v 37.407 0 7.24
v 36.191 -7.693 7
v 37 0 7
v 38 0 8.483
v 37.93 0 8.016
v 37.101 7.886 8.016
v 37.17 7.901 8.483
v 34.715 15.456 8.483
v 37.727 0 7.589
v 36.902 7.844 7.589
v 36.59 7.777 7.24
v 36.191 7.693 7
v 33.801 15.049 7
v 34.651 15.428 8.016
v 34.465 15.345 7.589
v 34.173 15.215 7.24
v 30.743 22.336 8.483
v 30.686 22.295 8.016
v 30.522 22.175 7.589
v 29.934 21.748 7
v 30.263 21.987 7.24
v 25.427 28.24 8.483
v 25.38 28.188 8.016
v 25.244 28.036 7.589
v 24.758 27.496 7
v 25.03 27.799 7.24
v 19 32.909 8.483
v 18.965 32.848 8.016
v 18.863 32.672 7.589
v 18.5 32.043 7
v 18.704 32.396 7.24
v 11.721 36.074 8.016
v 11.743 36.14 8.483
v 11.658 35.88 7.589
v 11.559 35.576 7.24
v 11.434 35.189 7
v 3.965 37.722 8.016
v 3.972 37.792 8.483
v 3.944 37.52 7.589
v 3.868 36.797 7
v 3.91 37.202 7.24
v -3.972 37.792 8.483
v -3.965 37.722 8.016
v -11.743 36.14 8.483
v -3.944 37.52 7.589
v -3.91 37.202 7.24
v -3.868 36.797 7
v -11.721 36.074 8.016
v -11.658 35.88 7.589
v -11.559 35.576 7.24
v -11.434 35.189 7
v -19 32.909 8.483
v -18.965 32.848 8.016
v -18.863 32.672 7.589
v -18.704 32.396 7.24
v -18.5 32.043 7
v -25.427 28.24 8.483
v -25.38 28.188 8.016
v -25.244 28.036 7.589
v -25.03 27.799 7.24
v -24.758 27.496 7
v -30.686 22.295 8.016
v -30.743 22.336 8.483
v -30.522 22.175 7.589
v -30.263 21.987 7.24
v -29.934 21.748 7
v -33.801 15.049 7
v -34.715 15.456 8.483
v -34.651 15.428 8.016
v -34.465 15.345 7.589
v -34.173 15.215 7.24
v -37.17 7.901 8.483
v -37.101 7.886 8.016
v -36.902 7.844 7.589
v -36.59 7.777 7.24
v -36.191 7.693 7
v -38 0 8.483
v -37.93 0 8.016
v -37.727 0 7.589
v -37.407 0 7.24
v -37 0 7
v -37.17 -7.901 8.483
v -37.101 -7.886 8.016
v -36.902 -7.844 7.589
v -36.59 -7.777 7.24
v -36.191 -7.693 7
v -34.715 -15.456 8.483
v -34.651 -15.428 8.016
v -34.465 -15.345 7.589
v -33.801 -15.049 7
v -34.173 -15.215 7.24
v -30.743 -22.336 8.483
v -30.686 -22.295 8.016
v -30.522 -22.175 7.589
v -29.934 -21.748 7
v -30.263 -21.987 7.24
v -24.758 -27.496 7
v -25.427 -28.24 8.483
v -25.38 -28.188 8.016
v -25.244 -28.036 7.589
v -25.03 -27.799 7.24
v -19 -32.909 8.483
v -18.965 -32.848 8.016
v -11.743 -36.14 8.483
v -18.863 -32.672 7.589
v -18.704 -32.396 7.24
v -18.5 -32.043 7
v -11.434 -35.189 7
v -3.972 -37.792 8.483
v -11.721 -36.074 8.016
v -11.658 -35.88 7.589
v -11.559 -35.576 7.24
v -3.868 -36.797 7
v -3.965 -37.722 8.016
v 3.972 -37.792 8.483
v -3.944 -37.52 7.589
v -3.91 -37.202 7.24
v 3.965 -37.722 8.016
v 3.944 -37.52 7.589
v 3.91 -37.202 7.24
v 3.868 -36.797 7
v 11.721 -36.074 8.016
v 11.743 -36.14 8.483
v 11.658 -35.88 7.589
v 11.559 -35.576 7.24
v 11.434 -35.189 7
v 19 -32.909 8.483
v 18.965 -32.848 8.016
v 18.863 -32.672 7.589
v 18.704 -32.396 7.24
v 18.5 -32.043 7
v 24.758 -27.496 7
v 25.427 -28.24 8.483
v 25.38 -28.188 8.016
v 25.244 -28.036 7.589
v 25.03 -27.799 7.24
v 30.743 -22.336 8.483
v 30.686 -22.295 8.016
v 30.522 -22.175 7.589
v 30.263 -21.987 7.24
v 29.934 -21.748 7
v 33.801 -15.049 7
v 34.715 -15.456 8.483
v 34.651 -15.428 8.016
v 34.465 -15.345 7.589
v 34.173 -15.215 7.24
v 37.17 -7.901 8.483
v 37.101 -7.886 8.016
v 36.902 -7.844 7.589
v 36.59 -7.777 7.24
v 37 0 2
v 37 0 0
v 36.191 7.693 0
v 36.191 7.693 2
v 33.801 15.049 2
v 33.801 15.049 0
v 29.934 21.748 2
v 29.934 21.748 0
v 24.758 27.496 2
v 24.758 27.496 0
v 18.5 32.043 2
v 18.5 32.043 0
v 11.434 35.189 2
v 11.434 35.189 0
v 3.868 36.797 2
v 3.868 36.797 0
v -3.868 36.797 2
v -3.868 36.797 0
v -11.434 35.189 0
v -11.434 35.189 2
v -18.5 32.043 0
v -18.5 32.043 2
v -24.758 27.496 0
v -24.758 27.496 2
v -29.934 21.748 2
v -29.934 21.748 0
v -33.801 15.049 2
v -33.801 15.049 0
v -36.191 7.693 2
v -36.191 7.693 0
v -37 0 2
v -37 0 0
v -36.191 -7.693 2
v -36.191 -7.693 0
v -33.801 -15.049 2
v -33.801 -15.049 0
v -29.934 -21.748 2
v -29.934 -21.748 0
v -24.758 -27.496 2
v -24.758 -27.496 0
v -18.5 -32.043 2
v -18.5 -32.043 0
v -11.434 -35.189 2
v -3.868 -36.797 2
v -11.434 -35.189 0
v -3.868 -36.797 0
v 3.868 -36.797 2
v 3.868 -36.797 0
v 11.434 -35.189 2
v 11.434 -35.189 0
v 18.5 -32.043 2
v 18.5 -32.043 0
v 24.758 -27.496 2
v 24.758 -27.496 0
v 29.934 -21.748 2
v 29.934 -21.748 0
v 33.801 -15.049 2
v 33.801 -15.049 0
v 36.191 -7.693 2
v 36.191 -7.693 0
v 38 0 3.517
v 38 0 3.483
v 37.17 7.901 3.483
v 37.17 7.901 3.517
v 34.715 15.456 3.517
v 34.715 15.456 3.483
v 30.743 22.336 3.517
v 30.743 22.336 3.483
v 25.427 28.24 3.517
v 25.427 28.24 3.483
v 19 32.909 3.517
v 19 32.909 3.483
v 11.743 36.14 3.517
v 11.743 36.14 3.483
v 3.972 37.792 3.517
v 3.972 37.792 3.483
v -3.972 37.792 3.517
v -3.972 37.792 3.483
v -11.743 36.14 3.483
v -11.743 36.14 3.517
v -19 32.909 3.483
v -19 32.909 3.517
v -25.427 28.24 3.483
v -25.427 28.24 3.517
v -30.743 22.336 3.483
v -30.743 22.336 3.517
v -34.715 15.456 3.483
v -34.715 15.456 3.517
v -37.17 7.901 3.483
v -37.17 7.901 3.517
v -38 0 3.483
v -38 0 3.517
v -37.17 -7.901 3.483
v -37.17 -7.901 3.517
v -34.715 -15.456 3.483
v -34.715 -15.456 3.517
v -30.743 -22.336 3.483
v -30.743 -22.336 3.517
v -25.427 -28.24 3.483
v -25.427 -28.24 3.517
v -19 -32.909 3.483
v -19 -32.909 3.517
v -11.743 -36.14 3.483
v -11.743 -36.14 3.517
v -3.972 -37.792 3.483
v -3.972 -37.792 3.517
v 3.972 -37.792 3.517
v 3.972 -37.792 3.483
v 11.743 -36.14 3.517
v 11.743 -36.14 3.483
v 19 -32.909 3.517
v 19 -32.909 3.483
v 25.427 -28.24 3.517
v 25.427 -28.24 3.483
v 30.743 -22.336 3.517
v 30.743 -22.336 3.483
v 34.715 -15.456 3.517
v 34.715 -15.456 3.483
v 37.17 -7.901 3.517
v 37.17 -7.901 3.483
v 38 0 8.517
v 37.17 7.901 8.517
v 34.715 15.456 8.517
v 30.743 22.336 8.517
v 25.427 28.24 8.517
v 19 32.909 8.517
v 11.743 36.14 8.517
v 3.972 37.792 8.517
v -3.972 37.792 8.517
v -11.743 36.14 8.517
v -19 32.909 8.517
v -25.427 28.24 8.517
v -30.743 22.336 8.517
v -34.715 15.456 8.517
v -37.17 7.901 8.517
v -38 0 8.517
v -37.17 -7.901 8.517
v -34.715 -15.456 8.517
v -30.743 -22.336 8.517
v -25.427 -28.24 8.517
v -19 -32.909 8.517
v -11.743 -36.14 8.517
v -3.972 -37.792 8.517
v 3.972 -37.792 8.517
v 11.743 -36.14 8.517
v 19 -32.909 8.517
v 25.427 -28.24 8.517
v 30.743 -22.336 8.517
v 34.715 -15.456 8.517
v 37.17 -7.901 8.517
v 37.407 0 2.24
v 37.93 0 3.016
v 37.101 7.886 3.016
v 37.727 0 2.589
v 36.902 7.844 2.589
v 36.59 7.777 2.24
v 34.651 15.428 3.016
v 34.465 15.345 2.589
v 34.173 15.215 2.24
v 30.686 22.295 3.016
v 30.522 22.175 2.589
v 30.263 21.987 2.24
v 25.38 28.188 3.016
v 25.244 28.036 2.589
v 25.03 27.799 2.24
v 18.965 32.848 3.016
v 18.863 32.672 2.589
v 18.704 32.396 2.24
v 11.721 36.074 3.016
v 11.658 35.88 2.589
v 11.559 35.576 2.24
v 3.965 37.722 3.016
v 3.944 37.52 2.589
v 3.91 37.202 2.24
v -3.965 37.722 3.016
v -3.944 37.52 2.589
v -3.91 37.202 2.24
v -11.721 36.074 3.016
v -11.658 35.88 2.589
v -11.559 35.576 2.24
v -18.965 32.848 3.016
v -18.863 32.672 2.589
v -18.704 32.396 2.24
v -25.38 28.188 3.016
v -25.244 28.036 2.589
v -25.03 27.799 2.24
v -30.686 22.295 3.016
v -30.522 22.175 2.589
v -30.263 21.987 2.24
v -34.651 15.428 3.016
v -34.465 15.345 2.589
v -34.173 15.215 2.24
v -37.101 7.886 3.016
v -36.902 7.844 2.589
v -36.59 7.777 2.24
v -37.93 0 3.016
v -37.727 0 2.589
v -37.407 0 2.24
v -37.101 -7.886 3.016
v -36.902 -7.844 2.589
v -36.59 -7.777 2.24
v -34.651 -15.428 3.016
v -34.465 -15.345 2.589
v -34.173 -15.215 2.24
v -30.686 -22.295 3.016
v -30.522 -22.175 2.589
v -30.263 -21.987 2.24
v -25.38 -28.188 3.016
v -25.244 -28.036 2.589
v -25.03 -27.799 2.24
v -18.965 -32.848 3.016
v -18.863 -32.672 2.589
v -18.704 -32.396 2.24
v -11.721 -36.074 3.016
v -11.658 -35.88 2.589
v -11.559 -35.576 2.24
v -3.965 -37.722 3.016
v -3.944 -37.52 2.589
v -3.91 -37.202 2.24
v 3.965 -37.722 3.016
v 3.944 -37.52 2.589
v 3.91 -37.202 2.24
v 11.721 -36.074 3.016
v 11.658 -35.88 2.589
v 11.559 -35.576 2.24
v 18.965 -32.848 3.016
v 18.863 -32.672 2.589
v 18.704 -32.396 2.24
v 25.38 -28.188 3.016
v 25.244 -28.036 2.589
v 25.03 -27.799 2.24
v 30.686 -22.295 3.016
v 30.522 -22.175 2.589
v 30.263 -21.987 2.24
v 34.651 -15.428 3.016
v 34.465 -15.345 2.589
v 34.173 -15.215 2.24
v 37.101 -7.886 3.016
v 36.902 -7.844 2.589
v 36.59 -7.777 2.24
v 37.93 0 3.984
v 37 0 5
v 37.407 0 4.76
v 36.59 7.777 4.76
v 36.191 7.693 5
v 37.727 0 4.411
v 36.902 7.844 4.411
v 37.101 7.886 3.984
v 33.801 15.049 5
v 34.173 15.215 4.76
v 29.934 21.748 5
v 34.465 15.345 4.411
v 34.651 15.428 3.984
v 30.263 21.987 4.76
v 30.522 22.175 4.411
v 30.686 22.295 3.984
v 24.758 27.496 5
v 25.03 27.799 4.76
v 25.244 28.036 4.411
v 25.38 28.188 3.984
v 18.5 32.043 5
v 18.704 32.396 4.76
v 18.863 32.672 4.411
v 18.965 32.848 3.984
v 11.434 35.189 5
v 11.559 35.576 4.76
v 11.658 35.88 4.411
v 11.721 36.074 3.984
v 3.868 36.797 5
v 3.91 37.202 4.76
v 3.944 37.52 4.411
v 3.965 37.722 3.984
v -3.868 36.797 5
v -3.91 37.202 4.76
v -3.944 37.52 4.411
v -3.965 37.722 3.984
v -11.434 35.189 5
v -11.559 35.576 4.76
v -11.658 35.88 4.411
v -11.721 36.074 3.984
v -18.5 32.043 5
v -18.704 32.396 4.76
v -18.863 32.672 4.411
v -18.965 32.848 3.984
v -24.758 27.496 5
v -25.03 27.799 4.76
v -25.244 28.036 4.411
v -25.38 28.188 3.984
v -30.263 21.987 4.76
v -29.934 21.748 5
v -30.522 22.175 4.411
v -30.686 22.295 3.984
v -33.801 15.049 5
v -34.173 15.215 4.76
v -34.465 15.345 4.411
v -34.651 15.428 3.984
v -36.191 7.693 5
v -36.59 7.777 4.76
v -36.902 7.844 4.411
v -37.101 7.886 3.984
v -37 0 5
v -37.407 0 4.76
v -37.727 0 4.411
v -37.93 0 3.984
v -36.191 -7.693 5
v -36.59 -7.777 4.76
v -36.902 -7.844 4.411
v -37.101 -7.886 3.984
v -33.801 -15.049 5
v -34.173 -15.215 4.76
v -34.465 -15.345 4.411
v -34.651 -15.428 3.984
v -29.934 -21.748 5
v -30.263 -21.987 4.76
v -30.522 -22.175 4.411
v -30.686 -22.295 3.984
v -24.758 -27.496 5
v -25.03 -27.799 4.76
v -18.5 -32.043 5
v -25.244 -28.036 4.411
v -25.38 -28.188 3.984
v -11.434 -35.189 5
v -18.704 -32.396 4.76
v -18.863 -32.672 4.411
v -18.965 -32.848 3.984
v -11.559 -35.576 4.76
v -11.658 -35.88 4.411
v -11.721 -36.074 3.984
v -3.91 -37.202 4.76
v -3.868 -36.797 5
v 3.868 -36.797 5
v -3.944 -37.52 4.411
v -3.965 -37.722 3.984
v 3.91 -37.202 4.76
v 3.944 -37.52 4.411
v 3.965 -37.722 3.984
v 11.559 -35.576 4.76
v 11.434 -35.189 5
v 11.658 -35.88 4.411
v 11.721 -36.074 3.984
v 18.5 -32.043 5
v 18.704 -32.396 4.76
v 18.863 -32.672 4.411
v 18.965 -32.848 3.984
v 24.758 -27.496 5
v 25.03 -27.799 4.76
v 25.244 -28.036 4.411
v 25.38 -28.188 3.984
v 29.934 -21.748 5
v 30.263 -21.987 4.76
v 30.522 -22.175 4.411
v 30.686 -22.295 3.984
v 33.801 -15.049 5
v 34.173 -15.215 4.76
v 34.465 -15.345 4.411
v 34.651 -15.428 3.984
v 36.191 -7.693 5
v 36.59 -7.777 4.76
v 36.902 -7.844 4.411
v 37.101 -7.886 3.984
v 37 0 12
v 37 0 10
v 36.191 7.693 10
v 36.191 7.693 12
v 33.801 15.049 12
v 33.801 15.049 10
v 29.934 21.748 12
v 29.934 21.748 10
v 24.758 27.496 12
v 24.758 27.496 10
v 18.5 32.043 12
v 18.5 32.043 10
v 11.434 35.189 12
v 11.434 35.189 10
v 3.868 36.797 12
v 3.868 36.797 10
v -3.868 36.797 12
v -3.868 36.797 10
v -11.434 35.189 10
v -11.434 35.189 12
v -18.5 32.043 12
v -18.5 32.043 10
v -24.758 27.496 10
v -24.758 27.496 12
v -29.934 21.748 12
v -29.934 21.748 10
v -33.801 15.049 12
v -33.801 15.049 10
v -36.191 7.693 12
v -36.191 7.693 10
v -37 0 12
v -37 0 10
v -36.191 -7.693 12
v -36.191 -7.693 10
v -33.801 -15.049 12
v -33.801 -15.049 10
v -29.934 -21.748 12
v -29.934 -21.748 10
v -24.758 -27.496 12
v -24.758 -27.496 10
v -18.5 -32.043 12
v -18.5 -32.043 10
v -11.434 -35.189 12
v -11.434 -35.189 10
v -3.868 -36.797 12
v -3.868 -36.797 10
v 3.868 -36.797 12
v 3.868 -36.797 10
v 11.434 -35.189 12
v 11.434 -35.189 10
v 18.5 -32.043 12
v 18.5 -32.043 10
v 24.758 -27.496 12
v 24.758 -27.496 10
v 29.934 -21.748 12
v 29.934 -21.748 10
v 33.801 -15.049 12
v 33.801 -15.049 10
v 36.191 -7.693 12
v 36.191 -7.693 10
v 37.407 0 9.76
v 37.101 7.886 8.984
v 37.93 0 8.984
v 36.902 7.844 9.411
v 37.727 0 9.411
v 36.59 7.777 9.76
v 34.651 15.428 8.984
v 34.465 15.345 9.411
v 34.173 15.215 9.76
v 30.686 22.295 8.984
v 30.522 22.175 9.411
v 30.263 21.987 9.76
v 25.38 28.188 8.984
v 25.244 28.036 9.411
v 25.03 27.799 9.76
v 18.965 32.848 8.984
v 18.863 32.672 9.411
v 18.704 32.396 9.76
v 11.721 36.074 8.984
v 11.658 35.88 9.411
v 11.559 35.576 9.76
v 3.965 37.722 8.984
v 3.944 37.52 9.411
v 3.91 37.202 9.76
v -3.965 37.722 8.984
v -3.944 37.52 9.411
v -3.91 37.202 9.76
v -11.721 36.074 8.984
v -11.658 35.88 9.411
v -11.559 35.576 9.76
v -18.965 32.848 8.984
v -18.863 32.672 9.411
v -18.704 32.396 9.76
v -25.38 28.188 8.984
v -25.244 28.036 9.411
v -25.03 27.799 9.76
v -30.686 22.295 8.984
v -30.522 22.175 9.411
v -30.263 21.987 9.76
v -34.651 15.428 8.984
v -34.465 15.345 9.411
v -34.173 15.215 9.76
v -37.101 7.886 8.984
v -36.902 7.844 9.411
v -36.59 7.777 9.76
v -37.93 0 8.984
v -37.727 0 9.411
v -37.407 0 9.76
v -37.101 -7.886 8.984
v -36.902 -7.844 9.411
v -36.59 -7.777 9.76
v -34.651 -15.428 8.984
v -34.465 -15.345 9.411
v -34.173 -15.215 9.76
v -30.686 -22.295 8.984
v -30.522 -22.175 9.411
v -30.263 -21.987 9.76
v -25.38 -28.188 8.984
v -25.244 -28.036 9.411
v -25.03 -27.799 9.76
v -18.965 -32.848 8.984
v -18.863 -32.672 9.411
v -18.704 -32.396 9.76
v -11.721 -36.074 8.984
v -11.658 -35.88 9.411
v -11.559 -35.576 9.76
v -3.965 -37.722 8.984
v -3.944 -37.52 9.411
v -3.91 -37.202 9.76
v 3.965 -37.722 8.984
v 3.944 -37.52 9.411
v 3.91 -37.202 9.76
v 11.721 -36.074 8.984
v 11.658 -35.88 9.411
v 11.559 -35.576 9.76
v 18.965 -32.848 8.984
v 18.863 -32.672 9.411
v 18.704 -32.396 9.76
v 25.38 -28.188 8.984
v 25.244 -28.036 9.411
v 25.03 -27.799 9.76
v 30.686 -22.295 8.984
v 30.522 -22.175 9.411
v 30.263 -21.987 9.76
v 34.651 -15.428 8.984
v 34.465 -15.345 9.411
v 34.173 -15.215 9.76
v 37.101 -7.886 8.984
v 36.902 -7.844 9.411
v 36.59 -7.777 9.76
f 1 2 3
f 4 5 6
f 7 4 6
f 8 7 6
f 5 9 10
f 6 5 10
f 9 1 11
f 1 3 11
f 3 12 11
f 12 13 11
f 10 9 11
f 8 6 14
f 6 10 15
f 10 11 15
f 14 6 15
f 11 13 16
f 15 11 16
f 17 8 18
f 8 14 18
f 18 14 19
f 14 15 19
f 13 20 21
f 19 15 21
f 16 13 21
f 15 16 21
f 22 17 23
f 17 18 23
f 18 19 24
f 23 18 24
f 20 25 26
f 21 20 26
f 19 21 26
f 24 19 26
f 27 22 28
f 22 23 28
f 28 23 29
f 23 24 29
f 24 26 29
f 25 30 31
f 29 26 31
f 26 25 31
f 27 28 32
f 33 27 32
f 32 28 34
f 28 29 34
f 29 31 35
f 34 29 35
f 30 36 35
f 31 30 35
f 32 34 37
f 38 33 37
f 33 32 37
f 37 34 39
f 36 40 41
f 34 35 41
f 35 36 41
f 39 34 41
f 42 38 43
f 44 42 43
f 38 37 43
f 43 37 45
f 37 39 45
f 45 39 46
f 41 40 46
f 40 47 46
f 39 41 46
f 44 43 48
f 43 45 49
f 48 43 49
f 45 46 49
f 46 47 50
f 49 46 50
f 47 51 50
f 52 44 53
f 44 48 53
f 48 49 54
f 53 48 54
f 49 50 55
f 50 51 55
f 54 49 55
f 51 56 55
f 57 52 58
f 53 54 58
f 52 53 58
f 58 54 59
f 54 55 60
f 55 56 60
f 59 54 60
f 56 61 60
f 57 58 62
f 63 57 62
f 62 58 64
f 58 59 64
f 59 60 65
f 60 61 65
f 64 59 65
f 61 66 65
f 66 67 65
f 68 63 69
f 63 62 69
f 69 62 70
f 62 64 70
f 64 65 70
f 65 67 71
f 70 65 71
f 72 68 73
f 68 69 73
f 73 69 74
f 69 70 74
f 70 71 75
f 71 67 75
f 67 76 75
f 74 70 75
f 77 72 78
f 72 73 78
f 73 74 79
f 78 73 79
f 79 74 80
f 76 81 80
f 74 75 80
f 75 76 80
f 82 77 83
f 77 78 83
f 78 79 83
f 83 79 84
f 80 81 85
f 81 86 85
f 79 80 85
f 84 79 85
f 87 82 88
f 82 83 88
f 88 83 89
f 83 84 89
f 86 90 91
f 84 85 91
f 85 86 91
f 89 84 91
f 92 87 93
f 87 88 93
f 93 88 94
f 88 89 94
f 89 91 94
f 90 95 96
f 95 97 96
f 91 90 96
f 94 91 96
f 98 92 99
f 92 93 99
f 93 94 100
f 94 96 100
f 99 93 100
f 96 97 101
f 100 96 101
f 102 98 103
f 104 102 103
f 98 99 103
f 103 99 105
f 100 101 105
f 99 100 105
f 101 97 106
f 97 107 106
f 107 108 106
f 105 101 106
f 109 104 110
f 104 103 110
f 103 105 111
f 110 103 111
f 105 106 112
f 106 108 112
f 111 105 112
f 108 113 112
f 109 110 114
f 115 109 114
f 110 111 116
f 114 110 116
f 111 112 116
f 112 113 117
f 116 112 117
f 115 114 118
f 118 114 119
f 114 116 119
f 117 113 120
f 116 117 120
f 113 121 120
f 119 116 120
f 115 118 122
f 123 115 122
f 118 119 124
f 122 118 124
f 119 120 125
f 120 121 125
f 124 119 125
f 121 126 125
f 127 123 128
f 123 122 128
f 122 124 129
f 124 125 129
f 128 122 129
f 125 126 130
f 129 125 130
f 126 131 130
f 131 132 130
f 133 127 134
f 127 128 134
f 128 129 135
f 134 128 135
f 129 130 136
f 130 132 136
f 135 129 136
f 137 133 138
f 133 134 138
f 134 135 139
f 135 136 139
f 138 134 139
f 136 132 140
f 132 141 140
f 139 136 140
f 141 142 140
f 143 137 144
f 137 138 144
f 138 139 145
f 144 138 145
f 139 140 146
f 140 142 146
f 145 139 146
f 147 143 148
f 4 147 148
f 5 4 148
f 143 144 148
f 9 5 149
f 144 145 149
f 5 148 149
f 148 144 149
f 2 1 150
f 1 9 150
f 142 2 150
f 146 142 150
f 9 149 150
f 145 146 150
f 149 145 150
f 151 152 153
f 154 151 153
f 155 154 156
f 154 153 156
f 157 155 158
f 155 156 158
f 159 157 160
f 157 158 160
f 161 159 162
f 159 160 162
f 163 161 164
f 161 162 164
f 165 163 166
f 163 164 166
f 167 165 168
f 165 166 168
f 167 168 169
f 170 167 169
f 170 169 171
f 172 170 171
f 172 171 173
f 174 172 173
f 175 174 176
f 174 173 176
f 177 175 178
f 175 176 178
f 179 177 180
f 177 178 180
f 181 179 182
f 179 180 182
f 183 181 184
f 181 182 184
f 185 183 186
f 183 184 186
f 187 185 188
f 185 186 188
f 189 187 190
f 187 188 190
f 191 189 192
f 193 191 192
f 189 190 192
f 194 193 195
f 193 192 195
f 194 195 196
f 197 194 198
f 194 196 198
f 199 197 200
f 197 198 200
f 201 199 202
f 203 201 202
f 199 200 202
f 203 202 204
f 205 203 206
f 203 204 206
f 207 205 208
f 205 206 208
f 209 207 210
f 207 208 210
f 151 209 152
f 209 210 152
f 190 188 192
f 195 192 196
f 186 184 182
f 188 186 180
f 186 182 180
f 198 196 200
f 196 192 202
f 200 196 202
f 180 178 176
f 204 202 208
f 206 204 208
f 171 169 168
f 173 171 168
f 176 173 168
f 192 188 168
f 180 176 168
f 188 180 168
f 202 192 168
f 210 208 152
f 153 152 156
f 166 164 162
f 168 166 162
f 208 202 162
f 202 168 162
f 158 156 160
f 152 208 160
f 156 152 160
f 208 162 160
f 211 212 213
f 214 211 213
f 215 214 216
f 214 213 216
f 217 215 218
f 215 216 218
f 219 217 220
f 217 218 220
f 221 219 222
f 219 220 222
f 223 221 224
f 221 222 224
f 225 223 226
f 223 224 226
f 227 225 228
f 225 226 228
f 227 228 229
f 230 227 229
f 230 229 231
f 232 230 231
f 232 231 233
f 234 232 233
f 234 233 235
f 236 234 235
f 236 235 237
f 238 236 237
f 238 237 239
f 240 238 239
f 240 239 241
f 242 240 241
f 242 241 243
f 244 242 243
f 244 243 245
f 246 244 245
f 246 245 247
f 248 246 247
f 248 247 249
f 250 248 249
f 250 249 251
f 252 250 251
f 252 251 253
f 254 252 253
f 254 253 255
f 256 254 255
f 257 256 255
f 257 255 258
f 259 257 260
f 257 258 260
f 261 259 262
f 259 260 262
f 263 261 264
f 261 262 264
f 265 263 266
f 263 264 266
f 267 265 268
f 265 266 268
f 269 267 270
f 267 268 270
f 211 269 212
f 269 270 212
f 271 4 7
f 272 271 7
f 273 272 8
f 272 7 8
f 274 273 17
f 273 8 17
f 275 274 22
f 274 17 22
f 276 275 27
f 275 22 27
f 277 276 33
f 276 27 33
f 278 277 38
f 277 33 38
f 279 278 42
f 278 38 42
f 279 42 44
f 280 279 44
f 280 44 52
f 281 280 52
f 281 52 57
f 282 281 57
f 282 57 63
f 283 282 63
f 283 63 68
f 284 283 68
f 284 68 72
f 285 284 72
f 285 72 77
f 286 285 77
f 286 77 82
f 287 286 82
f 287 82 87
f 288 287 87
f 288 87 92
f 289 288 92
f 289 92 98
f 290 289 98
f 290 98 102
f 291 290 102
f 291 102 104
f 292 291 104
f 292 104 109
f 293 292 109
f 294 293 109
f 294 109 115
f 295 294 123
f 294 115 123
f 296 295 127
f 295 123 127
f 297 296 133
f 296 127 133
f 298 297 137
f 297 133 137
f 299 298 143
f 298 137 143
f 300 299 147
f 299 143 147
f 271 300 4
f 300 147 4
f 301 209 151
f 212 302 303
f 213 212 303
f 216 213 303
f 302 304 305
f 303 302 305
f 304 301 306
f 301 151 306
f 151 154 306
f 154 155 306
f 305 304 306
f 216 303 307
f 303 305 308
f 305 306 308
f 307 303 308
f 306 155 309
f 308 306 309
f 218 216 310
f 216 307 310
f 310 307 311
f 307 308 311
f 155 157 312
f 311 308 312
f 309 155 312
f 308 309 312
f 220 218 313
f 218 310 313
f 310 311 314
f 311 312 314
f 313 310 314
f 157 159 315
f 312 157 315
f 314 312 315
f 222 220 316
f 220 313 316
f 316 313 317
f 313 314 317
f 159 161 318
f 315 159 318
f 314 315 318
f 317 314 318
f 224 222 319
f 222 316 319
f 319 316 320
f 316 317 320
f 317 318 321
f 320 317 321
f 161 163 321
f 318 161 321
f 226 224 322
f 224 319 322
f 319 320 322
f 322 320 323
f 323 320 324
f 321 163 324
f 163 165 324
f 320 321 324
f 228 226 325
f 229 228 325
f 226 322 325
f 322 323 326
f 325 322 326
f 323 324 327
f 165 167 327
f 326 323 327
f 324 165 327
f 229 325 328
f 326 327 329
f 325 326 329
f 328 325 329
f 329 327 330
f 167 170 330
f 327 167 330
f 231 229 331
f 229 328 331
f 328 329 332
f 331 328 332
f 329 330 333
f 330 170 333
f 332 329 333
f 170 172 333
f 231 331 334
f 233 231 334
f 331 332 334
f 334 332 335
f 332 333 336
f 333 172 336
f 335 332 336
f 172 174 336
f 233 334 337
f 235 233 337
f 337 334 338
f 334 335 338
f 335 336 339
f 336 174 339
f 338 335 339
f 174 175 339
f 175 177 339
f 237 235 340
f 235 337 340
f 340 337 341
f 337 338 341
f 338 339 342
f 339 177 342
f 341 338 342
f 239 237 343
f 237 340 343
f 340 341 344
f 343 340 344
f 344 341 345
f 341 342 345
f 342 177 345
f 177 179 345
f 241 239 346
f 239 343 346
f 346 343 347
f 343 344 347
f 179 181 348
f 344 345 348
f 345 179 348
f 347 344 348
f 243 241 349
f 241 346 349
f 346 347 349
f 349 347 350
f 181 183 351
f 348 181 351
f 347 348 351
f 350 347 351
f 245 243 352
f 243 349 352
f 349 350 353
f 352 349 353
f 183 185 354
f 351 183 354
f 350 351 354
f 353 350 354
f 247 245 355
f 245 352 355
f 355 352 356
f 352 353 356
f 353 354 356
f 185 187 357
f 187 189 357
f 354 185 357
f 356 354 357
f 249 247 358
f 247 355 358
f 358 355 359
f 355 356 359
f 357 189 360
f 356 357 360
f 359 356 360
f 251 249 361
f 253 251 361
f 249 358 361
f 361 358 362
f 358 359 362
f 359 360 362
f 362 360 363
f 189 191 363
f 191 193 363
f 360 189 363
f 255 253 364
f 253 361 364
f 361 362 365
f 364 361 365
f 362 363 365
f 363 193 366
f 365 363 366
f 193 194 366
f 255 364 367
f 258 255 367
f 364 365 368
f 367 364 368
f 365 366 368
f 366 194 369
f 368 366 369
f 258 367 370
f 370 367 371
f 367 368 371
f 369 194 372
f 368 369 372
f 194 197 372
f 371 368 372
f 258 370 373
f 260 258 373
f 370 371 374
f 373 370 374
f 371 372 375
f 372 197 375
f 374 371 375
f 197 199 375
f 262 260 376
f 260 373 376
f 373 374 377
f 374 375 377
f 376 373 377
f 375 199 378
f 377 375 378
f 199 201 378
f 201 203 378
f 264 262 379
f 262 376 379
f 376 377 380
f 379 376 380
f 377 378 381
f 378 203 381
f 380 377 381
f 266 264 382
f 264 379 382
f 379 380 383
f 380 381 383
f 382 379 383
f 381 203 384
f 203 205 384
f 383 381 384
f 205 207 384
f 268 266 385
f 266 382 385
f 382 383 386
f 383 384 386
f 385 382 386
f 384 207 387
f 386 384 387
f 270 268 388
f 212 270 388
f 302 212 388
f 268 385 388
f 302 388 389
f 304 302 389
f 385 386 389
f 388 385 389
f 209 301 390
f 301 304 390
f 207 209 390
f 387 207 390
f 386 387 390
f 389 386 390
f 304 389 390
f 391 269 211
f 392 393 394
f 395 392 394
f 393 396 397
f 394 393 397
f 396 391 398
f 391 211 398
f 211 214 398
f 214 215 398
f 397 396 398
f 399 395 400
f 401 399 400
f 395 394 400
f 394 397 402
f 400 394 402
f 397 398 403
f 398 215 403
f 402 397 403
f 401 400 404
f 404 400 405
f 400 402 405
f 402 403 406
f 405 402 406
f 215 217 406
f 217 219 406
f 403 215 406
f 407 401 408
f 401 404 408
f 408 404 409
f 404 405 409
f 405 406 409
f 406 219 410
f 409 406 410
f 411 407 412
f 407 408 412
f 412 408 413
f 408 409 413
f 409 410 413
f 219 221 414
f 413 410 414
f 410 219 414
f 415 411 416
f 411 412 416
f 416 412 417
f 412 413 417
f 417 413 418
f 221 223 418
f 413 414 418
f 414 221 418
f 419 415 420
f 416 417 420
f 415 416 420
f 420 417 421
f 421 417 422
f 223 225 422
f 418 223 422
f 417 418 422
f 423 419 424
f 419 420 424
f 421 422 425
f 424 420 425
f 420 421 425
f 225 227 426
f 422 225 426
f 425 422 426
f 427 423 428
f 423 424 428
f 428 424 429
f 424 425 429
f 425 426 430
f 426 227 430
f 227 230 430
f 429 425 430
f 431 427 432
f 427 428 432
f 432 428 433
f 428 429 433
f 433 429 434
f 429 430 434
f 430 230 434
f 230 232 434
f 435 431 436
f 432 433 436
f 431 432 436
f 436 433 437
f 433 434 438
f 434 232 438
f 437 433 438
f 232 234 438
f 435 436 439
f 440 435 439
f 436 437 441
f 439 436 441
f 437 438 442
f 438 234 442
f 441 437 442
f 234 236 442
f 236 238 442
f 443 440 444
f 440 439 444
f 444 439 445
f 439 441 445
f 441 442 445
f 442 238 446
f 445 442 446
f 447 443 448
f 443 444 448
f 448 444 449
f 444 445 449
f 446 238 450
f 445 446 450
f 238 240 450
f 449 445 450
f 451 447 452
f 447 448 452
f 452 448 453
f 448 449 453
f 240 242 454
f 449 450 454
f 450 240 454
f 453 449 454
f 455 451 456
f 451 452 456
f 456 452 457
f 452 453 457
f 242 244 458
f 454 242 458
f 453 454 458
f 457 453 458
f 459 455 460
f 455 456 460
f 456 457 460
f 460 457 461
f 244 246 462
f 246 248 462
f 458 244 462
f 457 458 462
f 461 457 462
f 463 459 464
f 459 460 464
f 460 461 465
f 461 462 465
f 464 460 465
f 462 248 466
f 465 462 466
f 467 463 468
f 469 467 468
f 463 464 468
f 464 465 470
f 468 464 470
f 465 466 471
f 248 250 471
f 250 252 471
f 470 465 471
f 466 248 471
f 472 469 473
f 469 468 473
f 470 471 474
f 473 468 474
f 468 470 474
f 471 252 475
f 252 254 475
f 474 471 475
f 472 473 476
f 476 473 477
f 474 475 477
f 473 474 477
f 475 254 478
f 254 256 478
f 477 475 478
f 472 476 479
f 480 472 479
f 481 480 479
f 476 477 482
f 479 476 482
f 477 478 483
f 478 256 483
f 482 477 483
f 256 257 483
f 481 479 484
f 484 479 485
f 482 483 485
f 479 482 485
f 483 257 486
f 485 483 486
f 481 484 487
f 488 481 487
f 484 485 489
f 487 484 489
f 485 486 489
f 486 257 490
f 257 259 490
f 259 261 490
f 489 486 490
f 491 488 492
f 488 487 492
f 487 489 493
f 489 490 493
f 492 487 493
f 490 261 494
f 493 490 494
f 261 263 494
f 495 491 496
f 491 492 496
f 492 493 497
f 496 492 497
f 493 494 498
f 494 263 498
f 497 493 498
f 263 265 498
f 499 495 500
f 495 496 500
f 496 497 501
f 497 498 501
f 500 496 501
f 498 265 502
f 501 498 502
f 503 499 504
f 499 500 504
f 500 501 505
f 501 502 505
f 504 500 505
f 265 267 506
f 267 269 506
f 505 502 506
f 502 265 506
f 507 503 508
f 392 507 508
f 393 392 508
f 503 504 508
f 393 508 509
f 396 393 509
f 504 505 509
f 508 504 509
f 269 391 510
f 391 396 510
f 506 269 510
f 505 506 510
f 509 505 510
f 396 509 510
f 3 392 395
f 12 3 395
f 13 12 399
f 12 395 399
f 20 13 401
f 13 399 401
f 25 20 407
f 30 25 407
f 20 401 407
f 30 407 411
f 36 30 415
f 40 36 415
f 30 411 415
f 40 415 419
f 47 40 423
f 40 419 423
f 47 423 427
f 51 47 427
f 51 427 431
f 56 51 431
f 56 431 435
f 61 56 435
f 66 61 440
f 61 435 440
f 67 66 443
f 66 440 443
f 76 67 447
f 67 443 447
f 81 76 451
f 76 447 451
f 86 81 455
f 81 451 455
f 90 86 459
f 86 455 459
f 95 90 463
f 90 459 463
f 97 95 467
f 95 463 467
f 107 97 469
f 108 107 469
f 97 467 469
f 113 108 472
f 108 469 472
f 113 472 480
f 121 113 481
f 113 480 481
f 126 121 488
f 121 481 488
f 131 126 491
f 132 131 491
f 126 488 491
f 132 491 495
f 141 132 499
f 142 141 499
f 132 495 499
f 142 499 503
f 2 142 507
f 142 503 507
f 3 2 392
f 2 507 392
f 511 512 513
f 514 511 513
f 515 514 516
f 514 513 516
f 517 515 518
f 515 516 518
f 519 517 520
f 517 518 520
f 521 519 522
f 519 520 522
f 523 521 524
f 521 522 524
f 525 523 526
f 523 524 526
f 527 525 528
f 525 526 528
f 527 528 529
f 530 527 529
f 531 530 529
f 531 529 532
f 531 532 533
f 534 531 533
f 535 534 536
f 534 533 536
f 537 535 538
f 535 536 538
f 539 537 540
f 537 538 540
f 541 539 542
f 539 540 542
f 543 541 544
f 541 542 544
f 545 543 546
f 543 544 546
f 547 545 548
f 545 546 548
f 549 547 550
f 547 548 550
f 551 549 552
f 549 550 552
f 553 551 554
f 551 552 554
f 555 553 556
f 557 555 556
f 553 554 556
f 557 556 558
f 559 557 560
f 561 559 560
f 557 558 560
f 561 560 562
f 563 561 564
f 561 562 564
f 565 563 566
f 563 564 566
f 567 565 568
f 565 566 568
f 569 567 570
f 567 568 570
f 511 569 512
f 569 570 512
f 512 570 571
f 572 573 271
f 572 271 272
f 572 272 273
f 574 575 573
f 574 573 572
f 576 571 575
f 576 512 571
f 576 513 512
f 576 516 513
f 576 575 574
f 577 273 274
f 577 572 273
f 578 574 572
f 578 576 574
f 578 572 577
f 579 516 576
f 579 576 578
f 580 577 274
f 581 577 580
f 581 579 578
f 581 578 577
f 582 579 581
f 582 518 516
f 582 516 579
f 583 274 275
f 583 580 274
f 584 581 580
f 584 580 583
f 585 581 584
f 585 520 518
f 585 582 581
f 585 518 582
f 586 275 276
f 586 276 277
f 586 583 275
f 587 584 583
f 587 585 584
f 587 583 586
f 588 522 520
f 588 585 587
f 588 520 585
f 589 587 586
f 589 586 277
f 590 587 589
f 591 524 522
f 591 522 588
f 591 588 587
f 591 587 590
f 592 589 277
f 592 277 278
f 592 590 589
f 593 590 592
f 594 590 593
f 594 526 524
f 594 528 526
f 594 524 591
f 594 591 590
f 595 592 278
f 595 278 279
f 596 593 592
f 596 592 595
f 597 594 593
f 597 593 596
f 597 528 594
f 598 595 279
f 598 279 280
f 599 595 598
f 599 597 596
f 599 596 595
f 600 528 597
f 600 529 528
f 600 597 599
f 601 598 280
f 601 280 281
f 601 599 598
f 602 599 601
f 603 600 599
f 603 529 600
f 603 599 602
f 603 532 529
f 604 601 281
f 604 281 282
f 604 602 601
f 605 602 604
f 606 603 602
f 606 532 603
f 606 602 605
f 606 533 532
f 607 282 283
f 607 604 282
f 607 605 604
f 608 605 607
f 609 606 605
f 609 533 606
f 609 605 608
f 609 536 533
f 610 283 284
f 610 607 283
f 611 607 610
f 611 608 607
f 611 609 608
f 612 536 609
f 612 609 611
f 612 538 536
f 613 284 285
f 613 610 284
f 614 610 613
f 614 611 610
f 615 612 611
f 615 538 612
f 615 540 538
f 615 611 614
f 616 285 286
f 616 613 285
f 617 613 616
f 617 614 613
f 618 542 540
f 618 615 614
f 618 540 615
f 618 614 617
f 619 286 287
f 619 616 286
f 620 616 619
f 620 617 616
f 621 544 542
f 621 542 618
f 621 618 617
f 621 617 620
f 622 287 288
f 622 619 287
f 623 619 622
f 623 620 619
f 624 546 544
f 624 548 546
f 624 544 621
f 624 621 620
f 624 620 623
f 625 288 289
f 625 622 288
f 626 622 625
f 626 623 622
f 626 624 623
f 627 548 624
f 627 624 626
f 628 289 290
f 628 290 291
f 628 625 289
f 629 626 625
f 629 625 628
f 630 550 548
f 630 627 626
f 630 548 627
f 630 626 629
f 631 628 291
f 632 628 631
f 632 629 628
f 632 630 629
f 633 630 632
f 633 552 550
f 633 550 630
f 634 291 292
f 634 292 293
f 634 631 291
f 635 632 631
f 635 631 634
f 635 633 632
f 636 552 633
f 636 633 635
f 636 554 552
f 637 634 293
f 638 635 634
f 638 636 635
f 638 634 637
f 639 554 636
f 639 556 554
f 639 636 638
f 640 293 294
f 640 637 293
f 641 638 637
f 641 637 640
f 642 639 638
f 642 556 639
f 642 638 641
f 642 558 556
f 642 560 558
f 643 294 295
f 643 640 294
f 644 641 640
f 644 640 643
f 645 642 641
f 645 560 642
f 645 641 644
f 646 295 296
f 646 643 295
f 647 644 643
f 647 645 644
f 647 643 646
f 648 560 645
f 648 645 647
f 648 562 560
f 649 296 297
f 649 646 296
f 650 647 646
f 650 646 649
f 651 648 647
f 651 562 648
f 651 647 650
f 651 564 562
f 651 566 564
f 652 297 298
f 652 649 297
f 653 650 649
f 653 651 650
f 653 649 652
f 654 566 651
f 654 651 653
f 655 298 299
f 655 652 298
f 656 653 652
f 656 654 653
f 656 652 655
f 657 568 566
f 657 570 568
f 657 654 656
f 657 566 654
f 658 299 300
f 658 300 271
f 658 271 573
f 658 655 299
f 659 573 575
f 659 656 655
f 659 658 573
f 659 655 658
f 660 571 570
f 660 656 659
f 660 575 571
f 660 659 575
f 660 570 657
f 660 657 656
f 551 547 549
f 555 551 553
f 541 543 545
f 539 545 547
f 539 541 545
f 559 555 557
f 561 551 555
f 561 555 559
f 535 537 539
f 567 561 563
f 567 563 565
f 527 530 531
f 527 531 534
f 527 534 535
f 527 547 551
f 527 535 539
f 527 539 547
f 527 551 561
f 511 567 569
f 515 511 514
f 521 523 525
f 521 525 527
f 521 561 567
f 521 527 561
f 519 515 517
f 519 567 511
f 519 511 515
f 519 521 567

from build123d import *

# Parameters (mm, degrees)
F0_R     = 37
F1_DEPTH = 2
F2_R     = 38
F3_DEPTH = 3
F4_R     = 37
F5_DEPTH = 2
F6_R     = 38
F7_DEPTH = 3
F8_R     = 37
F9_DEPTH = 2


# Not quite as in the source:
# - a fillet or chamfer that OpenCascade refuses, or shapes differently, is made with other operations: its cross-section is extruded or revolved along the edge and cut away or added


with BuildPart() as f1:
    # F0 (on Top) → F1 (new body)
    with BuildSketch(Plane.XY):
        Circle(F0_R)
    extrude(amount=F1_DEPTH)

    # F2 (on face) → F3 (join)
    with BuildSketch(Plane.XY.offset(2)):
        Circle(F2_R)
    extrude(amount=F3_DEPTH)

    # F4 (on face) → F5 (join)
    with BuildSketch(Plane.XY.offset(5)):
        Circle(F4_R)
    extrude(amount=F5_DEPTH)

    # F6 (on face) → F7 (join)
    with BuildSketch(Plane.XY.offset(7)):
        Circle(F6_R)
    extrude(amount=F7_DEPTH)

    # F8 (on face) → F9 (join)
    with BuildSketch(Plane.XY.offset(10)):
        Circle(F8_R)
    extrude(amount=F9_DEPTH)

    # F10: fillet of radius 1.6 on 4 edges, made by hand

    # F10_s1 → F10_t2 (revolve, cut)
    with BuildSketch(Plane.XZ):
        with BuildLine():
            ThreePointArc((38, 8.4832396974), (37.7266499161, 7.5888125064), (37, 7))
            Line((37, 7), (38, 7))
            Line((38, 7), (38, 8.4832396974))
        make_face()
    revolve(axis=Axis((0, 0, 7), (0, 0, 1)), mode=Mode.SUBTRACT)

    # F10_s3 → F10_t4 (revolve, cut)
    with BuildSketch(Plane.XZ):
        with BuildLine():
            ThreePointArc((38, 3.4832396974), (37.7266499161, 2.5888125064), (37, 2))
            Line((37, 2), (38, 2))
            Line((38, 2), (38, 3.4832396974))
        make_face()
    revolve(axis=Axis((0, 0, 2), (0, 0, 1)), mode=Mode.SUBTRACT)

    # F10_s5 → F10_t6 (revolve, cut)
    with BuildSketch(Plane.XZ):
        with BuildLine():
            ThreePointArc((38, 8.5167603026), (37.7266499161, 9.4111874936), (37, 10))
            Line((37, 10), (38, 10))
            Line((38, 10), (38, 8.5167603026))
        make_face()
    revolve(axis=Axis((0, 0, 10), (0, 0, 1)), mode=Mode.SUBTRACT)

    # F10_s7 → F10_t8 (revolve, cut)
    with BuildSketch(Plane.XZ):
        with BuildLine():
            ThreePointArc((37, 5), (37.7266499161, 4.4111874936), (38, 3.5167603026))
            Line((38, 3.5167603026), (38, 5))
            Line((38, 5), (37, 5))
        make_face()
    revolve(axis=Axis((0, 0, 5), (0, 0, 1)), mode=Mode.SUBTRACT)


solid = f1.part
